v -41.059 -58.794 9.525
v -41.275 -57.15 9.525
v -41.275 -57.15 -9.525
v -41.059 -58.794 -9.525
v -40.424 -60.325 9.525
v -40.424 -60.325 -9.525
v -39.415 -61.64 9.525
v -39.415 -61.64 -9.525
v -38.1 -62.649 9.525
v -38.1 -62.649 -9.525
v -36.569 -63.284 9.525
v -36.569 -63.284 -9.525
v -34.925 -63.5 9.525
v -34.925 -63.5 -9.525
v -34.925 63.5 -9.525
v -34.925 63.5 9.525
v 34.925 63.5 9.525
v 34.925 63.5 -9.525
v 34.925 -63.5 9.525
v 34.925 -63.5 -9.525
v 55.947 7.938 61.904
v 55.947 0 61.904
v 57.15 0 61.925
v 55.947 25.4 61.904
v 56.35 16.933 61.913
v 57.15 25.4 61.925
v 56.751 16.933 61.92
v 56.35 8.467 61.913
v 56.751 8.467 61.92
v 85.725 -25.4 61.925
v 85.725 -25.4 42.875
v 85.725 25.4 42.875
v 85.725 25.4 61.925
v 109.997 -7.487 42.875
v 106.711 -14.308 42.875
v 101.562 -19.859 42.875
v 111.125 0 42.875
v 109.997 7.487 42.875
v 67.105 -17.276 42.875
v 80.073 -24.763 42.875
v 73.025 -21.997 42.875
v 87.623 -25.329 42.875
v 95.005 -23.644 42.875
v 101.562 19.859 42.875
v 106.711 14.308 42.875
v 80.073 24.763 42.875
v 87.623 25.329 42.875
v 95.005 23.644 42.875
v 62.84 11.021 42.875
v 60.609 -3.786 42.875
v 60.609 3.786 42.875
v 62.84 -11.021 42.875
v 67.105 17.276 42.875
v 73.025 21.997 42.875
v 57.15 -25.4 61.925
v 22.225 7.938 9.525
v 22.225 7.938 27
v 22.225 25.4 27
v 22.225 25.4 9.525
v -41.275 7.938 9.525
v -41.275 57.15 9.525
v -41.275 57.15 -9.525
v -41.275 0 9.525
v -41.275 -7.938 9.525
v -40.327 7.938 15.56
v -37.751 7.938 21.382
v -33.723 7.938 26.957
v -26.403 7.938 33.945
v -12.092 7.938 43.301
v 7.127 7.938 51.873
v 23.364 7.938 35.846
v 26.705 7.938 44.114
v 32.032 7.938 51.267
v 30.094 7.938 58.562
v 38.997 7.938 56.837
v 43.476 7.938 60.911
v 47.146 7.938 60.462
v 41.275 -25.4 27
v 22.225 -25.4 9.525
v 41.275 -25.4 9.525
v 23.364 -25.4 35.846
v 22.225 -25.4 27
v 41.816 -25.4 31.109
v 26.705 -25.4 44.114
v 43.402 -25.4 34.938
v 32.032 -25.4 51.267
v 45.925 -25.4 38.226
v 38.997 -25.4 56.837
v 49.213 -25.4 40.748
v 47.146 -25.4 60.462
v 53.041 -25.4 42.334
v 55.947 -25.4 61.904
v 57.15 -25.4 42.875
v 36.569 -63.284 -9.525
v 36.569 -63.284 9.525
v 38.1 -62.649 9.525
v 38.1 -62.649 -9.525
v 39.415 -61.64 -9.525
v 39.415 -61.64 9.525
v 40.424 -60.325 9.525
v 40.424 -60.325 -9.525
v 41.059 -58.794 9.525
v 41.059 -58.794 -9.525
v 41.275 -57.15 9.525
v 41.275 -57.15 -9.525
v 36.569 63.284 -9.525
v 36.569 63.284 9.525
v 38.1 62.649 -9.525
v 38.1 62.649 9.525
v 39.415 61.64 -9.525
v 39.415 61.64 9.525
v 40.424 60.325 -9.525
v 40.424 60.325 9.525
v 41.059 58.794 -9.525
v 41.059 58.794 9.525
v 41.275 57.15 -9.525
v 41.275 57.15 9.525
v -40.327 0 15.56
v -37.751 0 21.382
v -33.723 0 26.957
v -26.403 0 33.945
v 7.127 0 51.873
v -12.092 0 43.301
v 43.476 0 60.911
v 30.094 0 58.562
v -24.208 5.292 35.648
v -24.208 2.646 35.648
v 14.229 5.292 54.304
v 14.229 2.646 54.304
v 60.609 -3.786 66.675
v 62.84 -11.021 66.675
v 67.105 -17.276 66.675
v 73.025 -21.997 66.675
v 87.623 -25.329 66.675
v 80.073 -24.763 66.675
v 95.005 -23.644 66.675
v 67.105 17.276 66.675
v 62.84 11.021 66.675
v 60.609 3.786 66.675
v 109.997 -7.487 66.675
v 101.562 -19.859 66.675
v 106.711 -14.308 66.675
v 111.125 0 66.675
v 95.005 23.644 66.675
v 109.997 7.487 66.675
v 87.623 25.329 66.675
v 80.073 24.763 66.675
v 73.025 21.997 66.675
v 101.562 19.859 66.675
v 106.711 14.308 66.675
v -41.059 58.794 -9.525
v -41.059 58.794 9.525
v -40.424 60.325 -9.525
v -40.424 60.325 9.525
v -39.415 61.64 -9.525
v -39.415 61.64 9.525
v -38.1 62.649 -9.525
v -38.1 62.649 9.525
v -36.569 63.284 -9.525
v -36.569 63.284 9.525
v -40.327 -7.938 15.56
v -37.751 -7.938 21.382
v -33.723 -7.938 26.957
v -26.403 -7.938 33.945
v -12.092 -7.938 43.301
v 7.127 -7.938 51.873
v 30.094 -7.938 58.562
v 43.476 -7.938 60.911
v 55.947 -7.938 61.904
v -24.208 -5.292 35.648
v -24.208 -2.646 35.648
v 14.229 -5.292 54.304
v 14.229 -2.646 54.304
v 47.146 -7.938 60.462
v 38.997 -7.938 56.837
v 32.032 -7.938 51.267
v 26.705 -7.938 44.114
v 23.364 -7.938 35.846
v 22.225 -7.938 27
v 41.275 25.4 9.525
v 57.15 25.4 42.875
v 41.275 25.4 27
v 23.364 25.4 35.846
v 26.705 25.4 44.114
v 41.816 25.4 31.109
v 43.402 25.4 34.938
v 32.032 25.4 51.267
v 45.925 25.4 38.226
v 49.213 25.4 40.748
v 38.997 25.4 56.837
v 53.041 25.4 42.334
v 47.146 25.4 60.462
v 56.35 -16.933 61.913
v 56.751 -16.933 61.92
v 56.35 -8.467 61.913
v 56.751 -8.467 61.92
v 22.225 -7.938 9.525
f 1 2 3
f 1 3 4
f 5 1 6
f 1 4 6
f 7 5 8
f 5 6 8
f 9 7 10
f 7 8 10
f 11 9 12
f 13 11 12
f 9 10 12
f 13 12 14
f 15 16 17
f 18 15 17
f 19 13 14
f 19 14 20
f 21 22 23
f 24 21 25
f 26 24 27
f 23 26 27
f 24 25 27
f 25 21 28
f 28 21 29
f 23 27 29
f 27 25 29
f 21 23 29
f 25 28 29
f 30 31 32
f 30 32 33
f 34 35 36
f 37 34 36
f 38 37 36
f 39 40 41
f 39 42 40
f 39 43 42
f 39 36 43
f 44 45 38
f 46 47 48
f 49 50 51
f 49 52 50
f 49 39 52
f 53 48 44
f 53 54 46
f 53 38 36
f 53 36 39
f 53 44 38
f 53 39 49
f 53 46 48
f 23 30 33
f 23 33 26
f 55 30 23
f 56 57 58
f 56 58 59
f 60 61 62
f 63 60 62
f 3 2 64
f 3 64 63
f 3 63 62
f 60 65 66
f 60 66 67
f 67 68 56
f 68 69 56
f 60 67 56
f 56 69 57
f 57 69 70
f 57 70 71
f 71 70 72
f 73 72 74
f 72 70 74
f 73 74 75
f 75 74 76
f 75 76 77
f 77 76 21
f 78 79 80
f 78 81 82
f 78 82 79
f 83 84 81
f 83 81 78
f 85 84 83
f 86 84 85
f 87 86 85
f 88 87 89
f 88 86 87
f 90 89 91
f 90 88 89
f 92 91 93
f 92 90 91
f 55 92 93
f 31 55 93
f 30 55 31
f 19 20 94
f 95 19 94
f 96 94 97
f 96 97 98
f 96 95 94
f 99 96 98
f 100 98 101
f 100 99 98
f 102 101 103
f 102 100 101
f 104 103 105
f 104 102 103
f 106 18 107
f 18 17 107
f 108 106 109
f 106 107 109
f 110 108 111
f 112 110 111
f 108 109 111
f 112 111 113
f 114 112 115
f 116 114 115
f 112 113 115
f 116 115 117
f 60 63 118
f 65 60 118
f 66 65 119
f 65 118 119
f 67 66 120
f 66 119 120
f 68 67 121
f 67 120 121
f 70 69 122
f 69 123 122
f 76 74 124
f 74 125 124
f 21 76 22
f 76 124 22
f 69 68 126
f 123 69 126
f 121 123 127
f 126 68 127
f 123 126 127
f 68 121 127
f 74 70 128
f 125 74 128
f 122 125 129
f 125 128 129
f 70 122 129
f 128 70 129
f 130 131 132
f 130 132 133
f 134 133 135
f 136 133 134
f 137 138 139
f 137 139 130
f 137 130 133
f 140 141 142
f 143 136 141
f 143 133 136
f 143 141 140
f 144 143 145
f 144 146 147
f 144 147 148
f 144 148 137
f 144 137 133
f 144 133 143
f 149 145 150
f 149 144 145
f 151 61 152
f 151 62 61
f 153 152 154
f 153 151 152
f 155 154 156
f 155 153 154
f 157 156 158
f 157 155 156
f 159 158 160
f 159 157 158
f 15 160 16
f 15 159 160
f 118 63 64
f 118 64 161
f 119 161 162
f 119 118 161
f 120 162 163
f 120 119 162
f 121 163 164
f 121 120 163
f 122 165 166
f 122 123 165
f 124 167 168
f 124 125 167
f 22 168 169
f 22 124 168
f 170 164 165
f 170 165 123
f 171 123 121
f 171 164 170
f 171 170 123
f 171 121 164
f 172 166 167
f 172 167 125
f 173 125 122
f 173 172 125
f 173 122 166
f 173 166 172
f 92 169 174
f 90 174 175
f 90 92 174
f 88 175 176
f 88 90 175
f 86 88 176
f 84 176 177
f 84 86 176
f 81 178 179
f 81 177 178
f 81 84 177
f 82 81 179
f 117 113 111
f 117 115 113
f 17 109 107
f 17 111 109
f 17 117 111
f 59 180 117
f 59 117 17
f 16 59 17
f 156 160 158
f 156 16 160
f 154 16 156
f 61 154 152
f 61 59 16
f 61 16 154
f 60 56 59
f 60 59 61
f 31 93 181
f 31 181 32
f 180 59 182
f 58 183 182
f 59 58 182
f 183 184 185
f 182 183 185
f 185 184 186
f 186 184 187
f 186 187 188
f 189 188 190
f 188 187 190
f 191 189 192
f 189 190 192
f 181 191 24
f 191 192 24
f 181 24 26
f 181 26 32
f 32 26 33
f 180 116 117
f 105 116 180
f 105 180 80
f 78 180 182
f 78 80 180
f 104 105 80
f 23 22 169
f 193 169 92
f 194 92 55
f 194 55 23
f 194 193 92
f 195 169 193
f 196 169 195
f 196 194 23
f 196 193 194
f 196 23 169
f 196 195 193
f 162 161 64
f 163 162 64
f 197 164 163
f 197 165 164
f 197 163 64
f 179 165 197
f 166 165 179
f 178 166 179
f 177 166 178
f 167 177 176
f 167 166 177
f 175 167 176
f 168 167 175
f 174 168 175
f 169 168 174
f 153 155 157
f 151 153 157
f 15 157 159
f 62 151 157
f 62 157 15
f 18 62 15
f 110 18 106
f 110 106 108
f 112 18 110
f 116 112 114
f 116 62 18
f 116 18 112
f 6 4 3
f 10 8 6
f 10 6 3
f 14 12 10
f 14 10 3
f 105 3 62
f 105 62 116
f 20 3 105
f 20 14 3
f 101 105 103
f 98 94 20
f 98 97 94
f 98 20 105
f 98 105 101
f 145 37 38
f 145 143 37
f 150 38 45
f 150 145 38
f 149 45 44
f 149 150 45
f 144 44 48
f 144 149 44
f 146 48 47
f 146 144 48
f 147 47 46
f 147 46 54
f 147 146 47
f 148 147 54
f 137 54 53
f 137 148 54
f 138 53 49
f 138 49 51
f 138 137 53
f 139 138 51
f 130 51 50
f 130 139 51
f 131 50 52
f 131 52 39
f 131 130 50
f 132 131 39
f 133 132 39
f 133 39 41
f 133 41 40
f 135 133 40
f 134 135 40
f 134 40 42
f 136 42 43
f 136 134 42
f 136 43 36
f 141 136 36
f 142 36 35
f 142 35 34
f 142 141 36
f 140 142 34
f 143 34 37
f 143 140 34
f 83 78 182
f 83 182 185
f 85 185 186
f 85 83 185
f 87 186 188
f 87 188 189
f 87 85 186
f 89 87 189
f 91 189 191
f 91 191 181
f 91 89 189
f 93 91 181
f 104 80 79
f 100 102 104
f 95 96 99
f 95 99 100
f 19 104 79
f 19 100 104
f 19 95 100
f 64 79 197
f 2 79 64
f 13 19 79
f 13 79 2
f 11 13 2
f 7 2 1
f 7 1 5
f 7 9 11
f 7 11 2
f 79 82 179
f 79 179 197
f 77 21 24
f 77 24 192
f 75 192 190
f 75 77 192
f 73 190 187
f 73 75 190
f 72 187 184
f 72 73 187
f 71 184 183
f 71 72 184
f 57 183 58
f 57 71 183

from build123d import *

# Parameters (mm, degrees)
F1_DEPTH = 63.5
F0_W     = 25.4
F0_H     = 19.05
F2_DEPTH = 25.4
F3_DEPTH = 7.9375
F5_R     = 6.35


with BuildPart() as f1:
    # F0 (on Front) → F1 (new body, symmetric)
    with BuildSketch(Plane.XZ):
        Polygon((41.275, -9.525), (41.275, 9.525), (22.225, 9.525), (-41.275, 9.525), (-41.275, -9.525), align=None)
    extrude(amount=F1_DEPTH, both=True)

    # F0 (on Front) → F2 (join, symmetric)
    with BuildSketch(Plane.XZ):
        with BuildLine():
            Line((22.225, 9.525), (41.275, 9.525))
            Line((41.275, 9.525), (41.275, 27.0002))
            ThreePointArc((41.275, 27.0002), (45.9246798487, 38.2255201513), (57.15, 42.8752))
            Line((57.15, 42.8752), (60.325, 42.8752))
            Line((60.325, 42.8752), (60.325, 61.9252))
            Line((60.325, 61.9252), (57.15, 61.9252))
            add(Edge.make_bspline(
                [(55.9467259749, 61.9044655935), (56.3504500822, 61.913953254), (56.7515757531, 61.9208715326), (57.15, 61.9252)],
                knots=[110.3114617473, 110.3114617473, 110.3114617473, 110.3114617473, 111.5045361635, 111.5045361635, 111.5045361635, 111.5045361635], degree=3))
            ThreePointArc((55.9467259749, 61.9044655935), (32.0324765321, 51.2667539341), (22.225, 27.0002))
            Line((22.225, 27.0002), (22.225, 9.525))
        make_face()
        with Locations((73.025, 52.4002)):
            Rectangle(F0_W, F0_H)
    extrude(amount=F2_DEPTH, both=True)

    # F0 (on Front) → F3 (join, symmetric)
    with BuildSketch(Plane.XZ):
        with BuildLine():
            Line((-41.275, 9.525), (22.225, 9.525))
            Line((22.225, 9.525), (22.225, 27.0002))
            ThreePointArc((22.225, 27.0002), (32.0324765321, 51.2667539341), (55.9467259749, 61.9044655935))
            add(Edge.make_bspline(
                [(-41.275, 9.525), (-40.9233677456, 38.1848250151), (18.6184622862, 61.0272380826), (55.9467259749, 61.9044655935)],
                knots=[0, 0, 0, 0, 110.3114617473, 110.3114617473, 110.3114617473, 110.3114617473], degree=3))
        make_face()
    extrude(amount=F3_DEPTH, both=True)

    # F5
    f5_edges = [f1.edges().sort_by_distance(p)[0] for p in [
        (-41.275, -63.5, 0),
        (41.275, -63.5, 0),
        (-41.275, 63.5, 0),
        (41.275, 63.5, 0),
    ]]
    fillet(f5_edges, radius=F5_R)


with BuildPart() as f4:
    # F0 (on Front) → F4 (revolve)
    with BuildSketch(Plane.XZ):
        Polygon((85.725, 61.9252), (85.725, 42.8752), (111.125, 42.8752), (111.125, 66.675), (85.725, 66.675), align=None)
    revolve(axis=Axis((85.725, 0, 54.7751), (0, 0, 1)))


solid = Compound([f1.part, f4.part])
